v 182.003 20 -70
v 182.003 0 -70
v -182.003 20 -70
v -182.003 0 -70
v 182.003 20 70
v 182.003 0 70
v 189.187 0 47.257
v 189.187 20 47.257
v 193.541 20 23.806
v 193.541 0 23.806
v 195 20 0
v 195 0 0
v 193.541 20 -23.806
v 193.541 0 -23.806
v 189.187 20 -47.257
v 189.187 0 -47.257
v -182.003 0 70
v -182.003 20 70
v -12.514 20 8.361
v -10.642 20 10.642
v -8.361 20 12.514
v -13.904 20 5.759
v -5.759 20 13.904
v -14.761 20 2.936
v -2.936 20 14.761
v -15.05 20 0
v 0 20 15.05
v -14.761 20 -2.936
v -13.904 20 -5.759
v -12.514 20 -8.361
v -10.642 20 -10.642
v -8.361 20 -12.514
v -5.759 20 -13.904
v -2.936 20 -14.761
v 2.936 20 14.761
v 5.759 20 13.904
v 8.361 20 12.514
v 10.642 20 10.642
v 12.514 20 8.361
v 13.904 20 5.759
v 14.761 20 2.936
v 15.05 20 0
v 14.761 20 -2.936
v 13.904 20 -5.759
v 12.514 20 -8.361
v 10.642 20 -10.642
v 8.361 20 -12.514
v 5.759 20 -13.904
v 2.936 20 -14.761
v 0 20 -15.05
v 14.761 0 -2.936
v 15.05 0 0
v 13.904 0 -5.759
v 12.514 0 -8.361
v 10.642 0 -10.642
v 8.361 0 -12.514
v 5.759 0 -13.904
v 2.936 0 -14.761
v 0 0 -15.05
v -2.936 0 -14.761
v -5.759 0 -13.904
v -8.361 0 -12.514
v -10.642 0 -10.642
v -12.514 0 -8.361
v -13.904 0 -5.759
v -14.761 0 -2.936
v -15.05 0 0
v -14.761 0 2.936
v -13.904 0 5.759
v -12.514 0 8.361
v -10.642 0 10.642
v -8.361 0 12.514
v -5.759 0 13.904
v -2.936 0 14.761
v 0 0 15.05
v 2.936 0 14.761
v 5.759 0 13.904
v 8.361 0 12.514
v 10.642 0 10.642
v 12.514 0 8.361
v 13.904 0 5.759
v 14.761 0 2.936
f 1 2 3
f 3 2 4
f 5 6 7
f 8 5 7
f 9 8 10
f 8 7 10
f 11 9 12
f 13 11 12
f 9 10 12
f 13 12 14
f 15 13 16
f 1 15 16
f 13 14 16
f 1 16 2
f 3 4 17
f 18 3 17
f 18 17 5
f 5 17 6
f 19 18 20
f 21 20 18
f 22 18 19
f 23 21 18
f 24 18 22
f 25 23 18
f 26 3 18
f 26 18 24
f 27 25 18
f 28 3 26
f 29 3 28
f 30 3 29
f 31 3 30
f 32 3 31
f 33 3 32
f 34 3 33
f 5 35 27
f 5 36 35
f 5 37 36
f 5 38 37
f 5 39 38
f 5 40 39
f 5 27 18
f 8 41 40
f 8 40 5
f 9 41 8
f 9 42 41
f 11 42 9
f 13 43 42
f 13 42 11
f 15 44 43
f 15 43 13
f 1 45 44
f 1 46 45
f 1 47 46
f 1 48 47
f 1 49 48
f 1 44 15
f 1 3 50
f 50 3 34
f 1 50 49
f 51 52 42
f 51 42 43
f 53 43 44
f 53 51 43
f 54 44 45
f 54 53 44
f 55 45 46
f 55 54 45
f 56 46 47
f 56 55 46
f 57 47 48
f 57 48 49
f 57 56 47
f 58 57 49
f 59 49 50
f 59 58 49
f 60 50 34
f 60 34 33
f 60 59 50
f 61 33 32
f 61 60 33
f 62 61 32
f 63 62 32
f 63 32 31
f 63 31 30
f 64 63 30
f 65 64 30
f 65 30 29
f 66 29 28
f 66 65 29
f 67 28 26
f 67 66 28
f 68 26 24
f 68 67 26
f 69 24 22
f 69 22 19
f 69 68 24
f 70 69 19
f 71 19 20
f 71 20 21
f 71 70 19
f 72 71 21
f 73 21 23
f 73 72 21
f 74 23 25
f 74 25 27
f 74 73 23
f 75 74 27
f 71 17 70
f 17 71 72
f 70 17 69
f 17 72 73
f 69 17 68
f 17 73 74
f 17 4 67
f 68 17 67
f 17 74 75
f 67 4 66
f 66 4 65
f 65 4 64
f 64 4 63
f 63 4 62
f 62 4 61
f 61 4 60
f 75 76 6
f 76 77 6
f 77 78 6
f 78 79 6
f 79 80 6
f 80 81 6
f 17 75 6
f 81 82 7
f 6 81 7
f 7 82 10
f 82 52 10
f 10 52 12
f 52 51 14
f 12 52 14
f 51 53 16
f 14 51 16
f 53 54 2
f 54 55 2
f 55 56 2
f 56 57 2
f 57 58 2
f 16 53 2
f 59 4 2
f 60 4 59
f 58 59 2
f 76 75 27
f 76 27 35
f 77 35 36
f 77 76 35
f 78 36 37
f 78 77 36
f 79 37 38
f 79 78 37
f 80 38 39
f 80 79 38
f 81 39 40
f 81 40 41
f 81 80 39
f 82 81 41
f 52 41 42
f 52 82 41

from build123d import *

# Parameters (mm, degrees)
AUFSATZ_LINEAR_AUSTRAGEN1_DEPTH = 20


with BuildPart() as part:
    # Skizze1 → Aufsatz-Linear austragen1 (new body)
    with BuildSketch(Plane(origin=(0, 0, 0), x_dir=(1, 0, 0), z_dir=(0, 1, 0))):
        with BuildLine():
            Line((182.002747232, 70), (-182.002747232, 70))
            Line((-182.002747232, 70), (-182.002747232, -70))
            Line((-182.002747232, -70), (182.002747232, -70))
            ThreePointArc((182.002747232, -70), (195, 0), (182.002747232, 70))
        make_face()
        with BuildLine():
            ThreePointArc((15.05, 0), (-10.641957057, 10.641957057), (0, -15.05))
            ThreePointArc((0, -15.05), (10.641957057, -10.641957057), (15.05, 0))
        make_face(mode=Mode.SUBTRACT)
    extrude(amount=AUFSATZ_LINEAR_AUSTRAGEN1_DEPTH)


solid = part.part
